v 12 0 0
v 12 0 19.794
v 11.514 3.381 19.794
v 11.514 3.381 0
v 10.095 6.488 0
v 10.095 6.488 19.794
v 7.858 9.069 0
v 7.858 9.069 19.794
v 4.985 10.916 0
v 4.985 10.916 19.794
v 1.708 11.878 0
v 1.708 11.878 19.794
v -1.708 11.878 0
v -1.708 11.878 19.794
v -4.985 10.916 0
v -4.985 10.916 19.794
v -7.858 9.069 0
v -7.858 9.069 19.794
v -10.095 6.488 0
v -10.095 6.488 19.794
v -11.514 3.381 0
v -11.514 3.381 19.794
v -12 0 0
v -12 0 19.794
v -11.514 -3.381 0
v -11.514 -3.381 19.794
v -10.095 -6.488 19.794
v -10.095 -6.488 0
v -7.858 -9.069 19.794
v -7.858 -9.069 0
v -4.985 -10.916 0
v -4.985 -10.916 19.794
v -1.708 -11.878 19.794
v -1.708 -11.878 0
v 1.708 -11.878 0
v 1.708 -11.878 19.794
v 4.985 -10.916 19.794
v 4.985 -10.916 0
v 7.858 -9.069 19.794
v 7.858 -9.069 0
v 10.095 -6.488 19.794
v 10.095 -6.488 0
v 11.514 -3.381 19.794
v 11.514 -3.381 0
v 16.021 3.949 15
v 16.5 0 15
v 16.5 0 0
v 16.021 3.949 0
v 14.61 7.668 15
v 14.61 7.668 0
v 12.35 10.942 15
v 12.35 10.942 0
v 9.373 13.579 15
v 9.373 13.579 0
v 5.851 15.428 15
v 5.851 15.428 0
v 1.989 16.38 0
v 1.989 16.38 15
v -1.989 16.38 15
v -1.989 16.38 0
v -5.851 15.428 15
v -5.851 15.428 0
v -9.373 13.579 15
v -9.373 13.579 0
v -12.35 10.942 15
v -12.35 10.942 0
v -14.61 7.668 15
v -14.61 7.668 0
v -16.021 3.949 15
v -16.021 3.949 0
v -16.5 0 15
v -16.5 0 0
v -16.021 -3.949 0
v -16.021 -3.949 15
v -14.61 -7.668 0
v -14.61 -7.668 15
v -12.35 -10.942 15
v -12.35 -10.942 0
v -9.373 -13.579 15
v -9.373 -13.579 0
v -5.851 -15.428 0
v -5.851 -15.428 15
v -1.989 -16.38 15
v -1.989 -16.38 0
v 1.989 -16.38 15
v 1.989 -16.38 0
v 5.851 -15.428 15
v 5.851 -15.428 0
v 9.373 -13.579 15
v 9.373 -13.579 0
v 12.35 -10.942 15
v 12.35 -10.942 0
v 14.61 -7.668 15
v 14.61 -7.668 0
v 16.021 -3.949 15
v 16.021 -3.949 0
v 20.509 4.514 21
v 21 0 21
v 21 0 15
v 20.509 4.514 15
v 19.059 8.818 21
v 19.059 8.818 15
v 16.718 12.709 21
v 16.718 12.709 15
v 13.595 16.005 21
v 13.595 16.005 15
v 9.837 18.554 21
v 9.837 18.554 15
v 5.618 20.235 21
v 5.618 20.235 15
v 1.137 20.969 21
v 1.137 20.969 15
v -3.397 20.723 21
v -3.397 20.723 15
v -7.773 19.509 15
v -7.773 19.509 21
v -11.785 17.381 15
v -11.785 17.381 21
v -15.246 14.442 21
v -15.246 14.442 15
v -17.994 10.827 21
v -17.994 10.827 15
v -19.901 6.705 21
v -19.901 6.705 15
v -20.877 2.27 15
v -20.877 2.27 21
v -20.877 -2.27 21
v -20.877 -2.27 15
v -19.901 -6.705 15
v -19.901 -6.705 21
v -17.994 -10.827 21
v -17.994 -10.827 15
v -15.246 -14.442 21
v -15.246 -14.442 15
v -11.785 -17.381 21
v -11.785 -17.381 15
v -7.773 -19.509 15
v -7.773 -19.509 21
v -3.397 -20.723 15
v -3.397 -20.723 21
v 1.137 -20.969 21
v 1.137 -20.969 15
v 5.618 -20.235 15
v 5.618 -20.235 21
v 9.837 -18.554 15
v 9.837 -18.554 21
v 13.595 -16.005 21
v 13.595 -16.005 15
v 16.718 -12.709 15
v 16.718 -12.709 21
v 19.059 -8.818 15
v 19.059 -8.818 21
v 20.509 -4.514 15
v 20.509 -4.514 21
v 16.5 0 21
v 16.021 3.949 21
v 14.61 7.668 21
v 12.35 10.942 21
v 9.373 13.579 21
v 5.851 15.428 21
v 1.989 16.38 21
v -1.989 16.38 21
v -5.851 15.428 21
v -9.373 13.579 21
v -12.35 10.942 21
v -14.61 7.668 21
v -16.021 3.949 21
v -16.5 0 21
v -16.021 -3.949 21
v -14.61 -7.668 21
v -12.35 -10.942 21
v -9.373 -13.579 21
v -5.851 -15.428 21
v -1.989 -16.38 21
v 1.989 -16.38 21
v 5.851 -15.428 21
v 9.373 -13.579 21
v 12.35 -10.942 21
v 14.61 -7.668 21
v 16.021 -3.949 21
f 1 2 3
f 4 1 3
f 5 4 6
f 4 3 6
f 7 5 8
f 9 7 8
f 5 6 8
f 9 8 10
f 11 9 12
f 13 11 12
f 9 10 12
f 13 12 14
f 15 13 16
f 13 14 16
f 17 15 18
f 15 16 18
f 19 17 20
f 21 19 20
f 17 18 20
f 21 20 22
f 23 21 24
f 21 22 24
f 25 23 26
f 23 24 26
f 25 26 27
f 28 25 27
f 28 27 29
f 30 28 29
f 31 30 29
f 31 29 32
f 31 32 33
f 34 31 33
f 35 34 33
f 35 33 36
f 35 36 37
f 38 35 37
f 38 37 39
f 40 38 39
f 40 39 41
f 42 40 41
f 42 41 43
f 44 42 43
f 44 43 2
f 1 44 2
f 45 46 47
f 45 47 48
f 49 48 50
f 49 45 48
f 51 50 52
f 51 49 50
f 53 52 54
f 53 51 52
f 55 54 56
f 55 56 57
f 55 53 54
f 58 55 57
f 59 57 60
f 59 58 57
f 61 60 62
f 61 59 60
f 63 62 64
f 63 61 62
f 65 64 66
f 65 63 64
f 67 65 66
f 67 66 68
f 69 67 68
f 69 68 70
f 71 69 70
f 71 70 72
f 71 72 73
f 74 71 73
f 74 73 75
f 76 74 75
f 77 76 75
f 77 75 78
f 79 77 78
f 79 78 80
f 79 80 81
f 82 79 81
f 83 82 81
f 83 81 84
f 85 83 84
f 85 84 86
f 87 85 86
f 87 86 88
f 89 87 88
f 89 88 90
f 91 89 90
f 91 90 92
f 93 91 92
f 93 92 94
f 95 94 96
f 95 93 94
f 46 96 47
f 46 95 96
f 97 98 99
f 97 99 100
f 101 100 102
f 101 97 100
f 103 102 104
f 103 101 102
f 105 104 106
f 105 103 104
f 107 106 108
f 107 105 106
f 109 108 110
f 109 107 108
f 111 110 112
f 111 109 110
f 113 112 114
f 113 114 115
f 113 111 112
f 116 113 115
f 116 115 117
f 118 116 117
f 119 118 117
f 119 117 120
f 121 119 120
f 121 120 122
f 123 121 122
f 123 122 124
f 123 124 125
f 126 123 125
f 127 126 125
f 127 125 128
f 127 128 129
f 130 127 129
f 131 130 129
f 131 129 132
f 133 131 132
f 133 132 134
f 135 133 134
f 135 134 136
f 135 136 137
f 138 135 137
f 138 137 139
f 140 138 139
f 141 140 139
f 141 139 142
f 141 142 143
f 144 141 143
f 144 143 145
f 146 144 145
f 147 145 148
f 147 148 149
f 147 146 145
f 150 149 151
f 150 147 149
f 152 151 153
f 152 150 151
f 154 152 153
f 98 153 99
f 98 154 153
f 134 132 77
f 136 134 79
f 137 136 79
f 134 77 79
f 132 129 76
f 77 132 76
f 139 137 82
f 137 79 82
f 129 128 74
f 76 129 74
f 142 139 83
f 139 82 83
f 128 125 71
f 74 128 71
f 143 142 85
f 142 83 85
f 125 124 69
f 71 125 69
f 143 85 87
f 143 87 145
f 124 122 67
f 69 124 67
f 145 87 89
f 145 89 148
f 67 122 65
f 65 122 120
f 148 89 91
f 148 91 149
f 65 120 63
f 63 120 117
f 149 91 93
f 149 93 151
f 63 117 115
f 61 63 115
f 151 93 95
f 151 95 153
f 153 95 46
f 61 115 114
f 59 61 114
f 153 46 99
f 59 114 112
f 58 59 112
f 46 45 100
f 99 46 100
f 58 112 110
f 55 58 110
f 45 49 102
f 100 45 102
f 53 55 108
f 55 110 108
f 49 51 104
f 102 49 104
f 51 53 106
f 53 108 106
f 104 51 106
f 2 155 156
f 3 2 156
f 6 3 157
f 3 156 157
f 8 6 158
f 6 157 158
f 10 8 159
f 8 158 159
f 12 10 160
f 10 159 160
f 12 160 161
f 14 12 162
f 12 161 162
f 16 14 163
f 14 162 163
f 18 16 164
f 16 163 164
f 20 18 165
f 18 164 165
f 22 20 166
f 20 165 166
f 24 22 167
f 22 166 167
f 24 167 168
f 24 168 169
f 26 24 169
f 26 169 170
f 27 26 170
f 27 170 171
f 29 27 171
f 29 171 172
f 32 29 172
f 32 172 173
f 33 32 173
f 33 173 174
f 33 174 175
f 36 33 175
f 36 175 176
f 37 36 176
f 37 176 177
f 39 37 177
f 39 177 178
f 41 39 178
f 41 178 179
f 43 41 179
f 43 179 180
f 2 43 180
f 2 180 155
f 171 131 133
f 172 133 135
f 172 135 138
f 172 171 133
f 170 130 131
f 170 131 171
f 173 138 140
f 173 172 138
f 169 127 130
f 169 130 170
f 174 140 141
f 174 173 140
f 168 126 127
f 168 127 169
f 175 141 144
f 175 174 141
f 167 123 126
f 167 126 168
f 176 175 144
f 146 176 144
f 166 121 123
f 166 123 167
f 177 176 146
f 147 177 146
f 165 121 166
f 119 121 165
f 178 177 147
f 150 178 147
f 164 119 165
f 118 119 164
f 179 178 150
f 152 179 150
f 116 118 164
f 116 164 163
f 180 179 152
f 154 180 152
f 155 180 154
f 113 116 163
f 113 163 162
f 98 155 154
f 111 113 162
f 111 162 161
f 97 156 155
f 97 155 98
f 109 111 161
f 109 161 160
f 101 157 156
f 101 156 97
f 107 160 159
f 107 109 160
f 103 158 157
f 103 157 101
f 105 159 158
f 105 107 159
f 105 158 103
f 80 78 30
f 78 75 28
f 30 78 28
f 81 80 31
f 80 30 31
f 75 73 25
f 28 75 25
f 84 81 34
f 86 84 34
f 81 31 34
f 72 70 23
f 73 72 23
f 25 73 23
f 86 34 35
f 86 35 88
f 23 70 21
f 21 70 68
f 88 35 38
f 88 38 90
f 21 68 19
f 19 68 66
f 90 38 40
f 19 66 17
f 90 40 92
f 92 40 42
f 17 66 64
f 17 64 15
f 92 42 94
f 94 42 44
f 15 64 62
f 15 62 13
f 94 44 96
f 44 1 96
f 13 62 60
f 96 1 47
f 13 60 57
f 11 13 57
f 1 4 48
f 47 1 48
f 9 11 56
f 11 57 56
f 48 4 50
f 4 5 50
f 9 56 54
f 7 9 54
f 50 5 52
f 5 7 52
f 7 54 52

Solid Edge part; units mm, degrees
sketch "Sketch1" plane through (0, 0, 0) normal (0, -1, 0) x (1, 0, 0)
  line L0 (16.5, 0) -> (16.5, 15)
  line L1 (16.5, 15) -> (21, 15)
  line L2 (21, 15) -> (21, 21)
  line L3 (21, 21) -> (16.5, 21)
  line L4 (16.5, 21) -> (12, 19.7942)
  line L5 (12, 0) -> (12, 19.7942)
  line L6 (12, 0) -> (16.5, 0)
revolve "RevolvedProtrusion1" add sketch "Sketch1" angle 360 about axis through (0, 0, 0) along (0, 0, 1)
properties material "Brass, yellow brass"
